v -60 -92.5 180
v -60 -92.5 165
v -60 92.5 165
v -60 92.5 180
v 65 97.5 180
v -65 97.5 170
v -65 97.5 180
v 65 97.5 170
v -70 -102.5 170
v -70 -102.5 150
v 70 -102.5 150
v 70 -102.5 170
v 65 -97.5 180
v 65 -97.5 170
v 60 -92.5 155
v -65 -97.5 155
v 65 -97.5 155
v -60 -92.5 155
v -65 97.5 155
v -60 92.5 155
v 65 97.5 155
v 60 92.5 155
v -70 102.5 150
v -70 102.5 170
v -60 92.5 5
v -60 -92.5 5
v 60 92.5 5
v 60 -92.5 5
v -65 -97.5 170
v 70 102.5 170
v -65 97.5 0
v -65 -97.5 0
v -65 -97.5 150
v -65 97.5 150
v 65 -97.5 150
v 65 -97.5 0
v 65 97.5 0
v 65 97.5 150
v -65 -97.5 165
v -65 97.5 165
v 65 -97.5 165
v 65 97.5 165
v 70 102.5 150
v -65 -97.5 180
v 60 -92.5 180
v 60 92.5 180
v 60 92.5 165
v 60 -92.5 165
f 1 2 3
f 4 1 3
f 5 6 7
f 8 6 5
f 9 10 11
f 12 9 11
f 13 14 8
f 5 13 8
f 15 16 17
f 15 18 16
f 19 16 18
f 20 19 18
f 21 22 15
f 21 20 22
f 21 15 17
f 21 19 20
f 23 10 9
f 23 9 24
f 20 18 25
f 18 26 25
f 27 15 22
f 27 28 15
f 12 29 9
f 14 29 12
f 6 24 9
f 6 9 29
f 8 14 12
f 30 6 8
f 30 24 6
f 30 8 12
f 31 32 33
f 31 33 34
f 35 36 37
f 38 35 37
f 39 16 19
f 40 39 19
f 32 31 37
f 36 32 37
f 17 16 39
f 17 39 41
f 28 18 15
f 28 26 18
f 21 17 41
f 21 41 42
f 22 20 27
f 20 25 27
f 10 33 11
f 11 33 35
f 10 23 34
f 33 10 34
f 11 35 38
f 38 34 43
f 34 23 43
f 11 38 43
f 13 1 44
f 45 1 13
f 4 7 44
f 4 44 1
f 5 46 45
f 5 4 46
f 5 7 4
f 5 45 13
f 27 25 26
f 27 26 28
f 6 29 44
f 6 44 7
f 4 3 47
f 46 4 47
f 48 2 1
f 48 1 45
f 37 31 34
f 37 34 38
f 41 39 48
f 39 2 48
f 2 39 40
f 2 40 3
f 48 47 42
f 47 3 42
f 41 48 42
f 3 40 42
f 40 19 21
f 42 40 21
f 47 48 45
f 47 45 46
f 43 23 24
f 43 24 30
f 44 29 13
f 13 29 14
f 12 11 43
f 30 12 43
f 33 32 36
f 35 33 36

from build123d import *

# Parameters (mm, degrees)
F0_W     = 130
F0_H     = 195
F2_DEPTH = 180
F3_START = 150
F1_W     = 139.9999979138
F1_H     = 204.9999979138
F3_DEPTH = 20
F4_T     = -5


with BuildPart() as f2:
    # F0 (on Top) → F2 (new body)
    with BuildSketch(Plane.XY):
        Rectangle(F0_W, F0_H)
    extrude(amount=F2_DEPTH)

    # F1 (on face) → F3 (join)
    with BuildSketch(Plane.XY.offset(F3_START)):
        Rectangle(F1_W, F1_H)
    extrude(amount=F3_DEPTH)

    # F4
    f4_openings = [f2.faces().sort_by_distance(p)[0] for p in [
        (0, 0, 180),
    ]]
    offset(amount=F4_T, openings=f4_openings, kind=Kind.INTERSECTION)


solid = f2.part
